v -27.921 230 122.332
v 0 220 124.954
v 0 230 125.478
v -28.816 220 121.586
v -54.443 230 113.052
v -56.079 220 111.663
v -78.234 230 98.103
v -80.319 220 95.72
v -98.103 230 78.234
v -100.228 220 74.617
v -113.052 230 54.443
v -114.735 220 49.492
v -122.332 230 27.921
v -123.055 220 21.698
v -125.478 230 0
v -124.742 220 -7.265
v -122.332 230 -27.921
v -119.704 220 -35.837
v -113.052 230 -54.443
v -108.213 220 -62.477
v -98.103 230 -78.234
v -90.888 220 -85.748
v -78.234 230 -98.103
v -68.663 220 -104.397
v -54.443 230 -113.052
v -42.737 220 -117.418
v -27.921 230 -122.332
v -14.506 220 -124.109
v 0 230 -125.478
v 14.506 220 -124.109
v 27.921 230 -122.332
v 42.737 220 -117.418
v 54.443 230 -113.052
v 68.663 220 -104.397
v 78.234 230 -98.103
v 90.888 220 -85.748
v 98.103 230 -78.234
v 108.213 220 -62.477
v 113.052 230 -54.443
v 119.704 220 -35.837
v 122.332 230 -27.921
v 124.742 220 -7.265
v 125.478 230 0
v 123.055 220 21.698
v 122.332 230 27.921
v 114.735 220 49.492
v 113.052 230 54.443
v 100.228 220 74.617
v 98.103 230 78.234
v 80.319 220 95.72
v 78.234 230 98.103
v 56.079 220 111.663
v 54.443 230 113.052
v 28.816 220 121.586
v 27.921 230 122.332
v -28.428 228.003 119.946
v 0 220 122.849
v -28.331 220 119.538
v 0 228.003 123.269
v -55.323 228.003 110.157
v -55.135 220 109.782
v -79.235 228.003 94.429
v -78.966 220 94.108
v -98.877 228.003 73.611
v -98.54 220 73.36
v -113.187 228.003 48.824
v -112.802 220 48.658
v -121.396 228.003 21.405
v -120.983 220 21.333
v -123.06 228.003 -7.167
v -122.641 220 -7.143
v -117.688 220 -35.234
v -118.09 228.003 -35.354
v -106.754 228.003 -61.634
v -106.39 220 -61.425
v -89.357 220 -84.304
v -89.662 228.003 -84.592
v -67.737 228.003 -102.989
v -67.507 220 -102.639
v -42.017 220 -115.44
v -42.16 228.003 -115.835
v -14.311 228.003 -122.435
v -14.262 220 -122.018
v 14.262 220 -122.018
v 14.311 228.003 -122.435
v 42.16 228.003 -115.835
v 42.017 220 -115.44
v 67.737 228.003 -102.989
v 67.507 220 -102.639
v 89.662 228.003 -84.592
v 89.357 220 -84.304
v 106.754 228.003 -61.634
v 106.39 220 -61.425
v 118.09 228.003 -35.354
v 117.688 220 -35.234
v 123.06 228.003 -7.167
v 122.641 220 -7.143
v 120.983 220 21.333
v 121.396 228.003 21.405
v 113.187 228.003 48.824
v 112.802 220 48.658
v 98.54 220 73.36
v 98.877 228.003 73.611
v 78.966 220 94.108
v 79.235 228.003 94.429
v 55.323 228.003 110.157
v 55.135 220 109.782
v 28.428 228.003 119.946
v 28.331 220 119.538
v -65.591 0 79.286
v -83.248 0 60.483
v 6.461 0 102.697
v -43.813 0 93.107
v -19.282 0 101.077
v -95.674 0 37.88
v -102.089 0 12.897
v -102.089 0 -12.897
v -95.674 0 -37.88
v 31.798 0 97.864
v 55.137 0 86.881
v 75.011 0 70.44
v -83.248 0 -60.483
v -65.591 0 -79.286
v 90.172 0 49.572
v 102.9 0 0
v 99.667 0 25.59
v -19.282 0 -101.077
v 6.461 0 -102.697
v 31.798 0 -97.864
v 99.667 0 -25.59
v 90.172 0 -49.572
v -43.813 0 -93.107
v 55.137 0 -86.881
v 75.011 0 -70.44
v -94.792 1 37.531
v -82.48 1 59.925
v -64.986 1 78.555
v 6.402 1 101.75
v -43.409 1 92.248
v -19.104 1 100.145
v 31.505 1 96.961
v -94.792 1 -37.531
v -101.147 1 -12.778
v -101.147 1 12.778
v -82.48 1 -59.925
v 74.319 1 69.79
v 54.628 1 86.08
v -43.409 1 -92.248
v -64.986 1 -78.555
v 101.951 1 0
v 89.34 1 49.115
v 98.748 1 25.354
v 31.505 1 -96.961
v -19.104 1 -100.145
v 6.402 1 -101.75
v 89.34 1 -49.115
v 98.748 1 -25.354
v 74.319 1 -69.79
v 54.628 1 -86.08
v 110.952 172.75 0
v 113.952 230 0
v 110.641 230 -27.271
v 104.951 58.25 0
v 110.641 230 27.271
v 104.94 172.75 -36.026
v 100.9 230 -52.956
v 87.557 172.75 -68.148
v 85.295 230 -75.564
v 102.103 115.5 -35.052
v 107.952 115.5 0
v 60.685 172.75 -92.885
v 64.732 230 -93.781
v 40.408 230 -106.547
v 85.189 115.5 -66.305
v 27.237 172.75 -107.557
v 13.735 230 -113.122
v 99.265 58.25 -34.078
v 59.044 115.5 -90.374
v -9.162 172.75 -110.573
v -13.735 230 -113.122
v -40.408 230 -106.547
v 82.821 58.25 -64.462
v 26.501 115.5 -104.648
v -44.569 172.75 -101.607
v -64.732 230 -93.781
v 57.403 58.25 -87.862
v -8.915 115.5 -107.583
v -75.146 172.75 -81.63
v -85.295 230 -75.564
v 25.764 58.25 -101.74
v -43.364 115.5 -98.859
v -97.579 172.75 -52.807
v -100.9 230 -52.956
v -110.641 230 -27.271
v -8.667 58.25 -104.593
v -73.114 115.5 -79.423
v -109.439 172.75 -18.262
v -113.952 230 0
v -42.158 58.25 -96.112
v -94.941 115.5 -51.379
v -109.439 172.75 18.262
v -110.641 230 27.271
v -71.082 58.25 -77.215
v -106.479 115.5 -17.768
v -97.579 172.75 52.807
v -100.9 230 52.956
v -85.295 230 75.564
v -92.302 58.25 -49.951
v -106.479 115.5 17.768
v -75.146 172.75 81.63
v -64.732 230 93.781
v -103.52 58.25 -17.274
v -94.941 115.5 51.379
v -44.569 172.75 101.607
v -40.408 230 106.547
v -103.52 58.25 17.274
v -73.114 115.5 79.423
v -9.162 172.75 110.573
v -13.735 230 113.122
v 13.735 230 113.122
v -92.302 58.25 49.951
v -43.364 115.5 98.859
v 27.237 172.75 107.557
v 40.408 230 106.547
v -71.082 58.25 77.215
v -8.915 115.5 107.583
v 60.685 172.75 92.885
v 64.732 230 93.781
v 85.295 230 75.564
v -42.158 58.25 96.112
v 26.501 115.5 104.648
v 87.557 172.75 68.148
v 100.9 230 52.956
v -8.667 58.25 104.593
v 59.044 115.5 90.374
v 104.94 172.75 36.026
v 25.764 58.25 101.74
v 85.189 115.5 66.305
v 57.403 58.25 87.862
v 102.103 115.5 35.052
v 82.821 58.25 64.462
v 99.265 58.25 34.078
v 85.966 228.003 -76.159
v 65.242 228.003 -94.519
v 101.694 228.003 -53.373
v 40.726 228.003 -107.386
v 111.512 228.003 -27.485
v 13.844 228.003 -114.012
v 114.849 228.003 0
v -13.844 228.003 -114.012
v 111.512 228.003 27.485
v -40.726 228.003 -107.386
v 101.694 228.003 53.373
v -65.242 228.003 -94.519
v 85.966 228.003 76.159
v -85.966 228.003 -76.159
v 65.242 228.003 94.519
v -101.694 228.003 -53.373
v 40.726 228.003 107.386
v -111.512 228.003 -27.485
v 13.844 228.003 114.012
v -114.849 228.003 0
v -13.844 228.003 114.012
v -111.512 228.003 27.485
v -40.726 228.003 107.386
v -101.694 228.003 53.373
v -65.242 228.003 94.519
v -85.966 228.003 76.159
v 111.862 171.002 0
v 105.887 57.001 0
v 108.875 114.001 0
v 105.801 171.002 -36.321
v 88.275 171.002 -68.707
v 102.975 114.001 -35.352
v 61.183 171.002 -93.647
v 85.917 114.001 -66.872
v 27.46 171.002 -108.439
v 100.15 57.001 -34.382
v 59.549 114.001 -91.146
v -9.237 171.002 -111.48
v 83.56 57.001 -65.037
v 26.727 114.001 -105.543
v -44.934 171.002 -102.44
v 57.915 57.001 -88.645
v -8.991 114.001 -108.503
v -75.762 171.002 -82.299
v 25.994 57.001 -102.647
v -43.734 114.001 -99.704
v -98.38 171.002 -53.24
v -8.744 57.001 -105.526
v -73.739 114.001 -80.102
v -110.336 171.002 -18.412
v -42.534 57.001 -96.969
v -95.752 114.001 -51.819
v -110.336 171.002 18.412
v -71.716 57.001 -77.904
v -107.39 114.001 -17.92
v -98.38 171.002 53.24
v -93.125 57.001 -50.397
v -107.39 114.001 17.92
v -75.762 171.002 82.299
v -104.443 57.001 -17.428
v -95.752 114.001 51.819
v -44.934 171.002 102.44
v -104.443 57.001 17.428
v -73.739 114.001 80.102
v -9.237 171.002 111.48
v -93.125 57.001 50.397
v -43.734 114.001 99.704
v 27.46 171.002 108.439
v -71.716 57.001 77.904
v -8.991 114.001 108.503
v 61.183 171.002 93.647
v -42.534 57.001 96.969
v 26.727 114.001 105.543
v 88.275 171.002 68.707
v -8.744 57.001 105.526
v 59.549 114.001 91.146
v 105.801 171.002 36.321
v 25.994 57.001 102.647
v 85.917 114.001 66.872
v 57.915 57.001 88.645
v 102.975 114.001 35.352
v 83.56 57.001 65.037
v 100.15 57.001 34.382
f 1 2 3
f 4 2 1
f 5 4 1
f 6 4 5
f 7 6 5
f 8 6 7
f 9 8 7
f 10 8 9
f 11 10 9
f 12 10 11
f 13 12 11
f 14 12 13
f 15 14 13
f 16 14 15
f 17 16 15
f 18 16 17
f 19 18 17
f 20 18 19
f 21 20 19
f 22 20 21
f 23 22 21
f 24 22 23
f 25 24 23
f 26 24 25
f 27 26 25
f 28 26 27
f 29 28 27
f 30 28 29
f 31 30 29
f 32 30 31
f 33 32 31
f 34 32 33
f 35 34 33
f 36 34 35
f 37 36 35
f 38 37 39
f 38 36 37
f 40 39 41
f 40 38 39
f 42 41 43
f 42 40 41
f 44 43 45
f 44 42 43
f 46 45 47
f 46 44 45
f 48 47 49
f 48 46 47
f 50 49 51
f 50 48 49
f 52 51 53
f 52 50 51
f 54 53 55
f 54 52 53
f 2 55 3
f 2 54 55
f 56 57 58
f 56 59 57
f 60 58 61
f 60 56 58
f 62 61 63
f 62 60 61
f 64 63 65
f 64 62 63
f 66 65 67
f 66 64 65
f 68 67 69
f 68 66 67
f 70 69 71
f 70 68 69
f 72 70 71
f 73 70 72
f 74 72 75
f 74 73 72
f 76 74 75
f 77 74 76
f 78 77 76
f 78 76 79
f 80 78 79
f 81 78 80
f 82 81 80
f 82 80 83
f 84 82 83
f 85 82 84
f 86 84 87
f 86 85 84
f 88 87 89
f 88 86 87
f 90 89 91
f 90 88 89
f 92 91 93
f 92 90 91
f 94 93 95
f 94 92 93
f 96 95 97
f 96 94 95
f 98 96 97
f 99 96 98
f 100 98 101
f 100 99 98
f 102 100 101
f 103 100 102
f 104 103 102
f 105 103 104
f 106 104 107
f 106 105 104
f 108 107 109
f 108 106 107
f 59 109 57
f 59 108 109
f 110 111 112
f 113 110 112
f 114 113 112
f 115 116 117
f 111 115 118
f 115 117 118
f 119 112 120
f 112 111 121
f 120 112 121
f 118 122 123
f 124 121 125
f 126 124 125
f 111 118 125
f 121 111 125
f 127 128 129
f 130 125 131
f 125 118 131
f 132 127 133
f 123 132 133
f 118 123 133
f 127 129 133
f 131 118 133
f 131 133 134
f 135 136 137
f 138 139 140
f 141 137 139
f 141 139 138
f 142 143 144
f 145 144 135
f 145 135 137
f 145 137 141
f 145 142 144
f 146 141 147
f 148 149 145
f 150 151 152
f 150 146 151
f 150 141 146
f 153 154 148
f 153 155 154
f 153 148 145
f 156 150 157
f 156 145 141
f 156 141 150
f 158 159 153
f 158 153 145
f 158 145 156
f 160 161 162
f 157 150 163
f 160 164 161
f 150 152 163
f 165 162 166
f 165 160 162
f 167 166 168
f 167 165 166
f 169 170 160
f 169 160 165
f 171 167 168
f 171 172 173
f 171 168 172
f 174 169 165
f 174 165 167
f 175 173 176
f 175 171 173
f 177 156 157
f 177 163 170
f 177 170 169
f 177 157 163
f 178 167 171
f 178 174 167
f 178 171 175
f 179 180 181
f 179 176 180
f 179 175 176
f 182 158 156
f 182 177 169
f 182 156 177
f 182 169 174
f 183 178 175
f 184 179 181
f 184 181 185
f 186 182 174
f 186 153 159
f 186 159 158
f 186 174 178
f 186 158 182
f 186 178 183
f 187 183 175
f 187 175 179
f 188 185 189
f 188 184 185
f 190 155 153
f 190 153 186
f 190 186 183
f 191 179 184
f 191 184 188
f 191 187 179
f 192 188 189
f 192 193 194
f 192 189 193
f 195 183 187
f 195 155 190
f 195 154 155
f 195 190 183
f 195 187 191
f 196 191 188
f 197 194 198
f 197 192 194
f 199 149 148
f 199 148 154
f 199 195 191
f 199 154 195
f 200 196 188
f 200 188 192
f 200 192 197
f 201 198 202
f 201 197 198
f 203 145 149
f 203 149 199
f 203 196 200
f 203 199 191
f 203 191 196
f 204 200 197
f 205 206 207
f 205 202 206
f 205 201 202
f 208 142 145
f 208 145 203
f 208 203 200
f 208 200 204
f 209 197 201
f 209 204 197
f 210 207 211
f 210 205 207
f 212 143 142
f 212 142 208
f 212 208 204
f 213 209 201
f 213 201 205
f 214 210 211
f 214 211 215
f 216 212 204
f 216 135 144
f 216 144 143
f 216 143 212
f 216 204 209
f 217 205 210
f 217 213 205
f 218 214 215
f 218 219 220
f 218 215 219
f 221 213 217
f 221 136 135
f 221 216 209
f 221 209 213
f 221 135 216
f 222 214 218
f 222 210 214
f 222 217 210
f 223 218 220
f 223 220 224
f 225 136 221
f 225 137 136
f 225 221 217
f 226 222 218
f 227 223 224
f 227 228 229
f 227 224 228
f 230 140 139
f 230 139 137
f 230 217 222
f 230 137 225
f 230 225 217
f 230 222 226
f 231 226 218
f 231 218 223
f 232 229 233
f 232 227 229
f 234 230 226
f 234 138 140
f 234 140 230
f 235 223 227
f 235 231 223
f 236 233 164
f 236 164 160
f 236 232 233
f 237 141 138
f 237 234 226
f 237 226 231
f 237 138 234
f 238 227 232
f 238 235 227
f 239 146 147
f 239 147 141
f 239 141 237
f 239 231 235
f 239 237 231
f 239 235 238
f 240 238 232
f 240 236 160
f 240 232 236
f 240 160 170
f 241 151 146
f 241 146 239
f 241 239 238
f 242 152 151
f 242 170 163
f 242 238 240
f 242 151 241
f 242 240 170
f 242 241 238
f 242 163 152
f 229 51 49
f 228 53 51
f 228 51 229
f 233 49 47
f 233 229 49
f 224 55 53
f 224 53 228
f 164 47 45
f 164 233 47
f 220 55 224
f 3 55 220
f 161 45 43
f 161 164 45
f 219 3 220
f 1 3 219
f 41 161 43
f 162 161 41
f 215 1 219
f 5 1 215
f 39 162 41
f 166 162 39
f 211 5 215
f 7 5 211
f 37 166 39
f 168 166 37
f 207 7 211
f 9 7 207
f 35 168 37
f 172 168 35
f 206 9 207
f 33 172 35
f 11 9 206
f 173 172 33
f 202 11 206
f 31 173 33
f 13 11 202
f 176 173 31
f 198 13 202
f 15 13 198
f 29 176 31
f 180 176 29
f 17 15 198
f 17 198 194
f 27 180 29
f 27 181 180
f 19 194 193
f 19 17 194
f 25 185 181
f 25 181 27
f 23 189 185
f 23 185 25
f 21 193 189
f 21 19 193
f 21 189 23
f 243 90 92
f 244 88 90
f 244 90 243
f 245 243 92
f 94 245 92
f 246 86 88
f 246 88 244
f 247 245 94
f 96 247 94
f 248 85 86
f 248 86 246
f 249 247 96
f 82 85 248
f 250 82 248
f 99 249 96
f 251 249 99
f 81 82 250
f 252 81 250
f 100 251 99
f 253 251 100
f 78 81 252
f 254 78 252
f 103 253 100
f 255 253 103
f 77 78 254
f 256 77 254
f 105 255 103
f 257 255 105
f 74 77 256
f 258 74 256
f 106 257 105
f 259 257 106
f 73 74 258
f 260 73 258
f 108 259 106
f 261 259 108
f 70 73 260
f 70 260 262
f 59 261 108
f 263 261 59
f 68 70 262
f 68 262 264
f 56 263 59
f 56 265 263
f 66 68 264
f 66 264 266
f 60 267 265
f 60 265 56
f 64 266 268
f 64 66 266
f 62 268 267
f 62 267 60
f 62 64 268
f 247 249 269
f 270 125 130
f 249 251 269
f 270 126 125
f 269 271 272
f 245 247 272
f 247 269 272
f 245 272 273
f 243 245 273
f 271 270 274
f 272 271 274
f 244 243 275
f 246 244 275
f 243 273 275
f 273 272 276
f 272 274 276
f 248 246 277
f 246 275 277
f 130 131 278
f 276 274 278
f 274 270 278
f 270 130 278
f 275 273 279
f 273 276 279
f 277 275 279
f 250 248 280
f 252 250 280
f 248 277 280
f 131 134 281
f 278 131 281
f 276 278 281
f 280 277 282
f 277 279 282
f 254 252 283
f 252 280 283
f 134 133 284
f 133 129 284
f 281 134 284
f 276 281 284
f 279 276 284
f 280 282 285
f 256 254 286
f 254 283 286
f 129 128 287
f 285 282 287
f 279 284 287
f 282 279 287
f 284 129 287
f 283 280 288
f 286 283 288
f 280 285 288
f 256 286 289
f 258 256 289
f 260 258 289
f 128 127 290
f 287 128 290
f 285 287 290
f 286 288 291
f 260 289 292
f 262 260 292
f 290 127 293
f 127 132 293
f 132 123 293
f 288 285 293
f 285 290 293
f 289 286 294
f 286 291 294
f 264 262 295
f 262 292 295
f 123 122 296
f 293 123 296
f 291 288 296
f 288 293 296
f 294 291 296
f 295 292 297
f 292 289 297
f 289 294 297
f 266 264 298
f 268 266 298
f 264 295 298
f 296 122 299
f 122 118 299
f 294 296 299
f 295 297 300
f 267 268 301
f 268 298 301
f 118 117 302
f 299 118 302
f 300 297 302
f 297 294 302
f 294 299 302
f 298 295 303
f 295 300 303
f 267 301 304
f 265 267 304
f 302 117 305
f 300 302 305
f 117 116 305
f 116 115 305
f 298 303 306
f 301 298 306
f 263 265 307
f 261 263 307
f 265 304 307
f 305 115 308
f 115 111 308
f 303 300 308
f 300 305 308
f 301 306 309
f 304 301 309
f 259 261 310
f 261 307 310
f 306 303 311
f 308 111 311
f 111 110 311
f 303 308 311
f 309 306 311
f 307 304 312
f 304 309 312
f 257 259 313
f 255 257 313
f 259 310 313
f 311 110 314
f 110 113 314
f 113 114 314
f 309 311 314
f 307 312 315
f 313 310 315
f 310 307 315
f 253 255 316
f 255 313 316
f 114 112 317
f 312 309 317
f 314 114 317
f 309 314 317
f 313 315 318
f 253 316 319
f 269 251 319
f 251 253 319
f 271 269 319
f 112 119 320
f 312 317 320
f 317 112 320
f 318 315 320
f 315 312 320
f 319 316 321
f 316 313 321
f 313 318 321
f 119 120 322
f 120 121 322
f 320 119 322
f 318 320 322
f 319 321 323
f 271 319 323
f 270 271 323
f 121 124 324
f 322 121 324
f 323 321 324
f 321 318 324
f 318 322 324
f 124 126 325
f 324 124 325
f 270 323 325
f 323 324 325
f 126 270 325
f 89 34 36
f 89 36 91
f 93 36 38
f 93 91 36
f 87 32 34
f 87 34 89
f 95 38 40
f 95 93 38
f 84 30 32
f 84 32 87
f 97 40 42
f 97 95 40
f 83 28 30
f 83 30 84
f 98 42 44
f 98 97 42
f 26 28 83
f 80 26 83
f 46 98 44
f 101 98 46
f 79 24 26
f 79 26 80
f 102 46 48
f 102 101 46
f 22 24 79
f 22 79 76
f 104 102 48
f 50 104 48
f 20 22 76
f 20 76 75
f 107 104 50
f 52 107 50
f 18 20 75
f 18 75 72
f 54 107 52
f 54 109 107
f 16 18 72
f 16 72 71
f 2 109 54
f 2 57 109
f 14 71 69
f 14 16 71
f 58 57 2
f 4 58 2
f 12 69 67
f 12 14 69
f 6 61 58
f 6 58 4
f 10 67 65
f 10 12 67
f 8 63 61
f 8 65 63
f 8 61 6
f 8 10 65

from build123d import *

# Parameters (mm, degrees)
SKETCH1_R           = 102.9
BOSS_EXTRUDE1_DEPTH = 230
BOSS_EXTRUDE1_DRAFT = -3
SHELL2_T            = -1


with BuildPart() as part:
    # Sketch1 → Boss-Extrude1 (with draft: the straight prism first)
    with BuildSketch(Plane(origin=(0, 0, 0), x_dir=(1, 0, 0), z_dir=(0, 1, 0))):
        Circle(SKETCH1_R)
    extrude(amount=BOSS_EXTRUDE1_DEPTH)
    # Boss-Extrude1: the draft: its side faces are tilted about the plane it starts from
    boss_extrude1_sides = [part.faces().sort_by_distance(p)[0] for p in [
        (-102.9, 115, 0),
    ]]
    draft(boss_extrude1_sides, Plane(origin=(0, 0, 0), x_dir=(1, 0, 0), z_dir=(0, 1, 0)), BOSS_EXTRUDE1_DRAFT)

    # Shell2
    shell2_openings = [part.faces().sort_by_distance(p)[0] for p in [
        (0, 230, 0),
    ]]
    offset(amount=SHELL2_T, openings=shell2_openings, kind=Kind.INTERSECTION)

    # Sketch4 → Revolve2 (revolve)
    with BuildSketch(Plane.XY, mode=Mode.PRIVATE) as revolve2_sk:
        Polygon((114.953789235, 230), (125.477867028, 230), (124.953789235, 220), (122.849117323, 220), (123.268523203, 228.00274093), (114.849117323, 228.00274093), align=None)
    revolve(revolve2_sk.sketch.rotate(Axis((0, 230, 0), (0, -1, 0)), 90), axis=Axis((0, 230, 0), (0, -1, 0)))


solid = part.part
